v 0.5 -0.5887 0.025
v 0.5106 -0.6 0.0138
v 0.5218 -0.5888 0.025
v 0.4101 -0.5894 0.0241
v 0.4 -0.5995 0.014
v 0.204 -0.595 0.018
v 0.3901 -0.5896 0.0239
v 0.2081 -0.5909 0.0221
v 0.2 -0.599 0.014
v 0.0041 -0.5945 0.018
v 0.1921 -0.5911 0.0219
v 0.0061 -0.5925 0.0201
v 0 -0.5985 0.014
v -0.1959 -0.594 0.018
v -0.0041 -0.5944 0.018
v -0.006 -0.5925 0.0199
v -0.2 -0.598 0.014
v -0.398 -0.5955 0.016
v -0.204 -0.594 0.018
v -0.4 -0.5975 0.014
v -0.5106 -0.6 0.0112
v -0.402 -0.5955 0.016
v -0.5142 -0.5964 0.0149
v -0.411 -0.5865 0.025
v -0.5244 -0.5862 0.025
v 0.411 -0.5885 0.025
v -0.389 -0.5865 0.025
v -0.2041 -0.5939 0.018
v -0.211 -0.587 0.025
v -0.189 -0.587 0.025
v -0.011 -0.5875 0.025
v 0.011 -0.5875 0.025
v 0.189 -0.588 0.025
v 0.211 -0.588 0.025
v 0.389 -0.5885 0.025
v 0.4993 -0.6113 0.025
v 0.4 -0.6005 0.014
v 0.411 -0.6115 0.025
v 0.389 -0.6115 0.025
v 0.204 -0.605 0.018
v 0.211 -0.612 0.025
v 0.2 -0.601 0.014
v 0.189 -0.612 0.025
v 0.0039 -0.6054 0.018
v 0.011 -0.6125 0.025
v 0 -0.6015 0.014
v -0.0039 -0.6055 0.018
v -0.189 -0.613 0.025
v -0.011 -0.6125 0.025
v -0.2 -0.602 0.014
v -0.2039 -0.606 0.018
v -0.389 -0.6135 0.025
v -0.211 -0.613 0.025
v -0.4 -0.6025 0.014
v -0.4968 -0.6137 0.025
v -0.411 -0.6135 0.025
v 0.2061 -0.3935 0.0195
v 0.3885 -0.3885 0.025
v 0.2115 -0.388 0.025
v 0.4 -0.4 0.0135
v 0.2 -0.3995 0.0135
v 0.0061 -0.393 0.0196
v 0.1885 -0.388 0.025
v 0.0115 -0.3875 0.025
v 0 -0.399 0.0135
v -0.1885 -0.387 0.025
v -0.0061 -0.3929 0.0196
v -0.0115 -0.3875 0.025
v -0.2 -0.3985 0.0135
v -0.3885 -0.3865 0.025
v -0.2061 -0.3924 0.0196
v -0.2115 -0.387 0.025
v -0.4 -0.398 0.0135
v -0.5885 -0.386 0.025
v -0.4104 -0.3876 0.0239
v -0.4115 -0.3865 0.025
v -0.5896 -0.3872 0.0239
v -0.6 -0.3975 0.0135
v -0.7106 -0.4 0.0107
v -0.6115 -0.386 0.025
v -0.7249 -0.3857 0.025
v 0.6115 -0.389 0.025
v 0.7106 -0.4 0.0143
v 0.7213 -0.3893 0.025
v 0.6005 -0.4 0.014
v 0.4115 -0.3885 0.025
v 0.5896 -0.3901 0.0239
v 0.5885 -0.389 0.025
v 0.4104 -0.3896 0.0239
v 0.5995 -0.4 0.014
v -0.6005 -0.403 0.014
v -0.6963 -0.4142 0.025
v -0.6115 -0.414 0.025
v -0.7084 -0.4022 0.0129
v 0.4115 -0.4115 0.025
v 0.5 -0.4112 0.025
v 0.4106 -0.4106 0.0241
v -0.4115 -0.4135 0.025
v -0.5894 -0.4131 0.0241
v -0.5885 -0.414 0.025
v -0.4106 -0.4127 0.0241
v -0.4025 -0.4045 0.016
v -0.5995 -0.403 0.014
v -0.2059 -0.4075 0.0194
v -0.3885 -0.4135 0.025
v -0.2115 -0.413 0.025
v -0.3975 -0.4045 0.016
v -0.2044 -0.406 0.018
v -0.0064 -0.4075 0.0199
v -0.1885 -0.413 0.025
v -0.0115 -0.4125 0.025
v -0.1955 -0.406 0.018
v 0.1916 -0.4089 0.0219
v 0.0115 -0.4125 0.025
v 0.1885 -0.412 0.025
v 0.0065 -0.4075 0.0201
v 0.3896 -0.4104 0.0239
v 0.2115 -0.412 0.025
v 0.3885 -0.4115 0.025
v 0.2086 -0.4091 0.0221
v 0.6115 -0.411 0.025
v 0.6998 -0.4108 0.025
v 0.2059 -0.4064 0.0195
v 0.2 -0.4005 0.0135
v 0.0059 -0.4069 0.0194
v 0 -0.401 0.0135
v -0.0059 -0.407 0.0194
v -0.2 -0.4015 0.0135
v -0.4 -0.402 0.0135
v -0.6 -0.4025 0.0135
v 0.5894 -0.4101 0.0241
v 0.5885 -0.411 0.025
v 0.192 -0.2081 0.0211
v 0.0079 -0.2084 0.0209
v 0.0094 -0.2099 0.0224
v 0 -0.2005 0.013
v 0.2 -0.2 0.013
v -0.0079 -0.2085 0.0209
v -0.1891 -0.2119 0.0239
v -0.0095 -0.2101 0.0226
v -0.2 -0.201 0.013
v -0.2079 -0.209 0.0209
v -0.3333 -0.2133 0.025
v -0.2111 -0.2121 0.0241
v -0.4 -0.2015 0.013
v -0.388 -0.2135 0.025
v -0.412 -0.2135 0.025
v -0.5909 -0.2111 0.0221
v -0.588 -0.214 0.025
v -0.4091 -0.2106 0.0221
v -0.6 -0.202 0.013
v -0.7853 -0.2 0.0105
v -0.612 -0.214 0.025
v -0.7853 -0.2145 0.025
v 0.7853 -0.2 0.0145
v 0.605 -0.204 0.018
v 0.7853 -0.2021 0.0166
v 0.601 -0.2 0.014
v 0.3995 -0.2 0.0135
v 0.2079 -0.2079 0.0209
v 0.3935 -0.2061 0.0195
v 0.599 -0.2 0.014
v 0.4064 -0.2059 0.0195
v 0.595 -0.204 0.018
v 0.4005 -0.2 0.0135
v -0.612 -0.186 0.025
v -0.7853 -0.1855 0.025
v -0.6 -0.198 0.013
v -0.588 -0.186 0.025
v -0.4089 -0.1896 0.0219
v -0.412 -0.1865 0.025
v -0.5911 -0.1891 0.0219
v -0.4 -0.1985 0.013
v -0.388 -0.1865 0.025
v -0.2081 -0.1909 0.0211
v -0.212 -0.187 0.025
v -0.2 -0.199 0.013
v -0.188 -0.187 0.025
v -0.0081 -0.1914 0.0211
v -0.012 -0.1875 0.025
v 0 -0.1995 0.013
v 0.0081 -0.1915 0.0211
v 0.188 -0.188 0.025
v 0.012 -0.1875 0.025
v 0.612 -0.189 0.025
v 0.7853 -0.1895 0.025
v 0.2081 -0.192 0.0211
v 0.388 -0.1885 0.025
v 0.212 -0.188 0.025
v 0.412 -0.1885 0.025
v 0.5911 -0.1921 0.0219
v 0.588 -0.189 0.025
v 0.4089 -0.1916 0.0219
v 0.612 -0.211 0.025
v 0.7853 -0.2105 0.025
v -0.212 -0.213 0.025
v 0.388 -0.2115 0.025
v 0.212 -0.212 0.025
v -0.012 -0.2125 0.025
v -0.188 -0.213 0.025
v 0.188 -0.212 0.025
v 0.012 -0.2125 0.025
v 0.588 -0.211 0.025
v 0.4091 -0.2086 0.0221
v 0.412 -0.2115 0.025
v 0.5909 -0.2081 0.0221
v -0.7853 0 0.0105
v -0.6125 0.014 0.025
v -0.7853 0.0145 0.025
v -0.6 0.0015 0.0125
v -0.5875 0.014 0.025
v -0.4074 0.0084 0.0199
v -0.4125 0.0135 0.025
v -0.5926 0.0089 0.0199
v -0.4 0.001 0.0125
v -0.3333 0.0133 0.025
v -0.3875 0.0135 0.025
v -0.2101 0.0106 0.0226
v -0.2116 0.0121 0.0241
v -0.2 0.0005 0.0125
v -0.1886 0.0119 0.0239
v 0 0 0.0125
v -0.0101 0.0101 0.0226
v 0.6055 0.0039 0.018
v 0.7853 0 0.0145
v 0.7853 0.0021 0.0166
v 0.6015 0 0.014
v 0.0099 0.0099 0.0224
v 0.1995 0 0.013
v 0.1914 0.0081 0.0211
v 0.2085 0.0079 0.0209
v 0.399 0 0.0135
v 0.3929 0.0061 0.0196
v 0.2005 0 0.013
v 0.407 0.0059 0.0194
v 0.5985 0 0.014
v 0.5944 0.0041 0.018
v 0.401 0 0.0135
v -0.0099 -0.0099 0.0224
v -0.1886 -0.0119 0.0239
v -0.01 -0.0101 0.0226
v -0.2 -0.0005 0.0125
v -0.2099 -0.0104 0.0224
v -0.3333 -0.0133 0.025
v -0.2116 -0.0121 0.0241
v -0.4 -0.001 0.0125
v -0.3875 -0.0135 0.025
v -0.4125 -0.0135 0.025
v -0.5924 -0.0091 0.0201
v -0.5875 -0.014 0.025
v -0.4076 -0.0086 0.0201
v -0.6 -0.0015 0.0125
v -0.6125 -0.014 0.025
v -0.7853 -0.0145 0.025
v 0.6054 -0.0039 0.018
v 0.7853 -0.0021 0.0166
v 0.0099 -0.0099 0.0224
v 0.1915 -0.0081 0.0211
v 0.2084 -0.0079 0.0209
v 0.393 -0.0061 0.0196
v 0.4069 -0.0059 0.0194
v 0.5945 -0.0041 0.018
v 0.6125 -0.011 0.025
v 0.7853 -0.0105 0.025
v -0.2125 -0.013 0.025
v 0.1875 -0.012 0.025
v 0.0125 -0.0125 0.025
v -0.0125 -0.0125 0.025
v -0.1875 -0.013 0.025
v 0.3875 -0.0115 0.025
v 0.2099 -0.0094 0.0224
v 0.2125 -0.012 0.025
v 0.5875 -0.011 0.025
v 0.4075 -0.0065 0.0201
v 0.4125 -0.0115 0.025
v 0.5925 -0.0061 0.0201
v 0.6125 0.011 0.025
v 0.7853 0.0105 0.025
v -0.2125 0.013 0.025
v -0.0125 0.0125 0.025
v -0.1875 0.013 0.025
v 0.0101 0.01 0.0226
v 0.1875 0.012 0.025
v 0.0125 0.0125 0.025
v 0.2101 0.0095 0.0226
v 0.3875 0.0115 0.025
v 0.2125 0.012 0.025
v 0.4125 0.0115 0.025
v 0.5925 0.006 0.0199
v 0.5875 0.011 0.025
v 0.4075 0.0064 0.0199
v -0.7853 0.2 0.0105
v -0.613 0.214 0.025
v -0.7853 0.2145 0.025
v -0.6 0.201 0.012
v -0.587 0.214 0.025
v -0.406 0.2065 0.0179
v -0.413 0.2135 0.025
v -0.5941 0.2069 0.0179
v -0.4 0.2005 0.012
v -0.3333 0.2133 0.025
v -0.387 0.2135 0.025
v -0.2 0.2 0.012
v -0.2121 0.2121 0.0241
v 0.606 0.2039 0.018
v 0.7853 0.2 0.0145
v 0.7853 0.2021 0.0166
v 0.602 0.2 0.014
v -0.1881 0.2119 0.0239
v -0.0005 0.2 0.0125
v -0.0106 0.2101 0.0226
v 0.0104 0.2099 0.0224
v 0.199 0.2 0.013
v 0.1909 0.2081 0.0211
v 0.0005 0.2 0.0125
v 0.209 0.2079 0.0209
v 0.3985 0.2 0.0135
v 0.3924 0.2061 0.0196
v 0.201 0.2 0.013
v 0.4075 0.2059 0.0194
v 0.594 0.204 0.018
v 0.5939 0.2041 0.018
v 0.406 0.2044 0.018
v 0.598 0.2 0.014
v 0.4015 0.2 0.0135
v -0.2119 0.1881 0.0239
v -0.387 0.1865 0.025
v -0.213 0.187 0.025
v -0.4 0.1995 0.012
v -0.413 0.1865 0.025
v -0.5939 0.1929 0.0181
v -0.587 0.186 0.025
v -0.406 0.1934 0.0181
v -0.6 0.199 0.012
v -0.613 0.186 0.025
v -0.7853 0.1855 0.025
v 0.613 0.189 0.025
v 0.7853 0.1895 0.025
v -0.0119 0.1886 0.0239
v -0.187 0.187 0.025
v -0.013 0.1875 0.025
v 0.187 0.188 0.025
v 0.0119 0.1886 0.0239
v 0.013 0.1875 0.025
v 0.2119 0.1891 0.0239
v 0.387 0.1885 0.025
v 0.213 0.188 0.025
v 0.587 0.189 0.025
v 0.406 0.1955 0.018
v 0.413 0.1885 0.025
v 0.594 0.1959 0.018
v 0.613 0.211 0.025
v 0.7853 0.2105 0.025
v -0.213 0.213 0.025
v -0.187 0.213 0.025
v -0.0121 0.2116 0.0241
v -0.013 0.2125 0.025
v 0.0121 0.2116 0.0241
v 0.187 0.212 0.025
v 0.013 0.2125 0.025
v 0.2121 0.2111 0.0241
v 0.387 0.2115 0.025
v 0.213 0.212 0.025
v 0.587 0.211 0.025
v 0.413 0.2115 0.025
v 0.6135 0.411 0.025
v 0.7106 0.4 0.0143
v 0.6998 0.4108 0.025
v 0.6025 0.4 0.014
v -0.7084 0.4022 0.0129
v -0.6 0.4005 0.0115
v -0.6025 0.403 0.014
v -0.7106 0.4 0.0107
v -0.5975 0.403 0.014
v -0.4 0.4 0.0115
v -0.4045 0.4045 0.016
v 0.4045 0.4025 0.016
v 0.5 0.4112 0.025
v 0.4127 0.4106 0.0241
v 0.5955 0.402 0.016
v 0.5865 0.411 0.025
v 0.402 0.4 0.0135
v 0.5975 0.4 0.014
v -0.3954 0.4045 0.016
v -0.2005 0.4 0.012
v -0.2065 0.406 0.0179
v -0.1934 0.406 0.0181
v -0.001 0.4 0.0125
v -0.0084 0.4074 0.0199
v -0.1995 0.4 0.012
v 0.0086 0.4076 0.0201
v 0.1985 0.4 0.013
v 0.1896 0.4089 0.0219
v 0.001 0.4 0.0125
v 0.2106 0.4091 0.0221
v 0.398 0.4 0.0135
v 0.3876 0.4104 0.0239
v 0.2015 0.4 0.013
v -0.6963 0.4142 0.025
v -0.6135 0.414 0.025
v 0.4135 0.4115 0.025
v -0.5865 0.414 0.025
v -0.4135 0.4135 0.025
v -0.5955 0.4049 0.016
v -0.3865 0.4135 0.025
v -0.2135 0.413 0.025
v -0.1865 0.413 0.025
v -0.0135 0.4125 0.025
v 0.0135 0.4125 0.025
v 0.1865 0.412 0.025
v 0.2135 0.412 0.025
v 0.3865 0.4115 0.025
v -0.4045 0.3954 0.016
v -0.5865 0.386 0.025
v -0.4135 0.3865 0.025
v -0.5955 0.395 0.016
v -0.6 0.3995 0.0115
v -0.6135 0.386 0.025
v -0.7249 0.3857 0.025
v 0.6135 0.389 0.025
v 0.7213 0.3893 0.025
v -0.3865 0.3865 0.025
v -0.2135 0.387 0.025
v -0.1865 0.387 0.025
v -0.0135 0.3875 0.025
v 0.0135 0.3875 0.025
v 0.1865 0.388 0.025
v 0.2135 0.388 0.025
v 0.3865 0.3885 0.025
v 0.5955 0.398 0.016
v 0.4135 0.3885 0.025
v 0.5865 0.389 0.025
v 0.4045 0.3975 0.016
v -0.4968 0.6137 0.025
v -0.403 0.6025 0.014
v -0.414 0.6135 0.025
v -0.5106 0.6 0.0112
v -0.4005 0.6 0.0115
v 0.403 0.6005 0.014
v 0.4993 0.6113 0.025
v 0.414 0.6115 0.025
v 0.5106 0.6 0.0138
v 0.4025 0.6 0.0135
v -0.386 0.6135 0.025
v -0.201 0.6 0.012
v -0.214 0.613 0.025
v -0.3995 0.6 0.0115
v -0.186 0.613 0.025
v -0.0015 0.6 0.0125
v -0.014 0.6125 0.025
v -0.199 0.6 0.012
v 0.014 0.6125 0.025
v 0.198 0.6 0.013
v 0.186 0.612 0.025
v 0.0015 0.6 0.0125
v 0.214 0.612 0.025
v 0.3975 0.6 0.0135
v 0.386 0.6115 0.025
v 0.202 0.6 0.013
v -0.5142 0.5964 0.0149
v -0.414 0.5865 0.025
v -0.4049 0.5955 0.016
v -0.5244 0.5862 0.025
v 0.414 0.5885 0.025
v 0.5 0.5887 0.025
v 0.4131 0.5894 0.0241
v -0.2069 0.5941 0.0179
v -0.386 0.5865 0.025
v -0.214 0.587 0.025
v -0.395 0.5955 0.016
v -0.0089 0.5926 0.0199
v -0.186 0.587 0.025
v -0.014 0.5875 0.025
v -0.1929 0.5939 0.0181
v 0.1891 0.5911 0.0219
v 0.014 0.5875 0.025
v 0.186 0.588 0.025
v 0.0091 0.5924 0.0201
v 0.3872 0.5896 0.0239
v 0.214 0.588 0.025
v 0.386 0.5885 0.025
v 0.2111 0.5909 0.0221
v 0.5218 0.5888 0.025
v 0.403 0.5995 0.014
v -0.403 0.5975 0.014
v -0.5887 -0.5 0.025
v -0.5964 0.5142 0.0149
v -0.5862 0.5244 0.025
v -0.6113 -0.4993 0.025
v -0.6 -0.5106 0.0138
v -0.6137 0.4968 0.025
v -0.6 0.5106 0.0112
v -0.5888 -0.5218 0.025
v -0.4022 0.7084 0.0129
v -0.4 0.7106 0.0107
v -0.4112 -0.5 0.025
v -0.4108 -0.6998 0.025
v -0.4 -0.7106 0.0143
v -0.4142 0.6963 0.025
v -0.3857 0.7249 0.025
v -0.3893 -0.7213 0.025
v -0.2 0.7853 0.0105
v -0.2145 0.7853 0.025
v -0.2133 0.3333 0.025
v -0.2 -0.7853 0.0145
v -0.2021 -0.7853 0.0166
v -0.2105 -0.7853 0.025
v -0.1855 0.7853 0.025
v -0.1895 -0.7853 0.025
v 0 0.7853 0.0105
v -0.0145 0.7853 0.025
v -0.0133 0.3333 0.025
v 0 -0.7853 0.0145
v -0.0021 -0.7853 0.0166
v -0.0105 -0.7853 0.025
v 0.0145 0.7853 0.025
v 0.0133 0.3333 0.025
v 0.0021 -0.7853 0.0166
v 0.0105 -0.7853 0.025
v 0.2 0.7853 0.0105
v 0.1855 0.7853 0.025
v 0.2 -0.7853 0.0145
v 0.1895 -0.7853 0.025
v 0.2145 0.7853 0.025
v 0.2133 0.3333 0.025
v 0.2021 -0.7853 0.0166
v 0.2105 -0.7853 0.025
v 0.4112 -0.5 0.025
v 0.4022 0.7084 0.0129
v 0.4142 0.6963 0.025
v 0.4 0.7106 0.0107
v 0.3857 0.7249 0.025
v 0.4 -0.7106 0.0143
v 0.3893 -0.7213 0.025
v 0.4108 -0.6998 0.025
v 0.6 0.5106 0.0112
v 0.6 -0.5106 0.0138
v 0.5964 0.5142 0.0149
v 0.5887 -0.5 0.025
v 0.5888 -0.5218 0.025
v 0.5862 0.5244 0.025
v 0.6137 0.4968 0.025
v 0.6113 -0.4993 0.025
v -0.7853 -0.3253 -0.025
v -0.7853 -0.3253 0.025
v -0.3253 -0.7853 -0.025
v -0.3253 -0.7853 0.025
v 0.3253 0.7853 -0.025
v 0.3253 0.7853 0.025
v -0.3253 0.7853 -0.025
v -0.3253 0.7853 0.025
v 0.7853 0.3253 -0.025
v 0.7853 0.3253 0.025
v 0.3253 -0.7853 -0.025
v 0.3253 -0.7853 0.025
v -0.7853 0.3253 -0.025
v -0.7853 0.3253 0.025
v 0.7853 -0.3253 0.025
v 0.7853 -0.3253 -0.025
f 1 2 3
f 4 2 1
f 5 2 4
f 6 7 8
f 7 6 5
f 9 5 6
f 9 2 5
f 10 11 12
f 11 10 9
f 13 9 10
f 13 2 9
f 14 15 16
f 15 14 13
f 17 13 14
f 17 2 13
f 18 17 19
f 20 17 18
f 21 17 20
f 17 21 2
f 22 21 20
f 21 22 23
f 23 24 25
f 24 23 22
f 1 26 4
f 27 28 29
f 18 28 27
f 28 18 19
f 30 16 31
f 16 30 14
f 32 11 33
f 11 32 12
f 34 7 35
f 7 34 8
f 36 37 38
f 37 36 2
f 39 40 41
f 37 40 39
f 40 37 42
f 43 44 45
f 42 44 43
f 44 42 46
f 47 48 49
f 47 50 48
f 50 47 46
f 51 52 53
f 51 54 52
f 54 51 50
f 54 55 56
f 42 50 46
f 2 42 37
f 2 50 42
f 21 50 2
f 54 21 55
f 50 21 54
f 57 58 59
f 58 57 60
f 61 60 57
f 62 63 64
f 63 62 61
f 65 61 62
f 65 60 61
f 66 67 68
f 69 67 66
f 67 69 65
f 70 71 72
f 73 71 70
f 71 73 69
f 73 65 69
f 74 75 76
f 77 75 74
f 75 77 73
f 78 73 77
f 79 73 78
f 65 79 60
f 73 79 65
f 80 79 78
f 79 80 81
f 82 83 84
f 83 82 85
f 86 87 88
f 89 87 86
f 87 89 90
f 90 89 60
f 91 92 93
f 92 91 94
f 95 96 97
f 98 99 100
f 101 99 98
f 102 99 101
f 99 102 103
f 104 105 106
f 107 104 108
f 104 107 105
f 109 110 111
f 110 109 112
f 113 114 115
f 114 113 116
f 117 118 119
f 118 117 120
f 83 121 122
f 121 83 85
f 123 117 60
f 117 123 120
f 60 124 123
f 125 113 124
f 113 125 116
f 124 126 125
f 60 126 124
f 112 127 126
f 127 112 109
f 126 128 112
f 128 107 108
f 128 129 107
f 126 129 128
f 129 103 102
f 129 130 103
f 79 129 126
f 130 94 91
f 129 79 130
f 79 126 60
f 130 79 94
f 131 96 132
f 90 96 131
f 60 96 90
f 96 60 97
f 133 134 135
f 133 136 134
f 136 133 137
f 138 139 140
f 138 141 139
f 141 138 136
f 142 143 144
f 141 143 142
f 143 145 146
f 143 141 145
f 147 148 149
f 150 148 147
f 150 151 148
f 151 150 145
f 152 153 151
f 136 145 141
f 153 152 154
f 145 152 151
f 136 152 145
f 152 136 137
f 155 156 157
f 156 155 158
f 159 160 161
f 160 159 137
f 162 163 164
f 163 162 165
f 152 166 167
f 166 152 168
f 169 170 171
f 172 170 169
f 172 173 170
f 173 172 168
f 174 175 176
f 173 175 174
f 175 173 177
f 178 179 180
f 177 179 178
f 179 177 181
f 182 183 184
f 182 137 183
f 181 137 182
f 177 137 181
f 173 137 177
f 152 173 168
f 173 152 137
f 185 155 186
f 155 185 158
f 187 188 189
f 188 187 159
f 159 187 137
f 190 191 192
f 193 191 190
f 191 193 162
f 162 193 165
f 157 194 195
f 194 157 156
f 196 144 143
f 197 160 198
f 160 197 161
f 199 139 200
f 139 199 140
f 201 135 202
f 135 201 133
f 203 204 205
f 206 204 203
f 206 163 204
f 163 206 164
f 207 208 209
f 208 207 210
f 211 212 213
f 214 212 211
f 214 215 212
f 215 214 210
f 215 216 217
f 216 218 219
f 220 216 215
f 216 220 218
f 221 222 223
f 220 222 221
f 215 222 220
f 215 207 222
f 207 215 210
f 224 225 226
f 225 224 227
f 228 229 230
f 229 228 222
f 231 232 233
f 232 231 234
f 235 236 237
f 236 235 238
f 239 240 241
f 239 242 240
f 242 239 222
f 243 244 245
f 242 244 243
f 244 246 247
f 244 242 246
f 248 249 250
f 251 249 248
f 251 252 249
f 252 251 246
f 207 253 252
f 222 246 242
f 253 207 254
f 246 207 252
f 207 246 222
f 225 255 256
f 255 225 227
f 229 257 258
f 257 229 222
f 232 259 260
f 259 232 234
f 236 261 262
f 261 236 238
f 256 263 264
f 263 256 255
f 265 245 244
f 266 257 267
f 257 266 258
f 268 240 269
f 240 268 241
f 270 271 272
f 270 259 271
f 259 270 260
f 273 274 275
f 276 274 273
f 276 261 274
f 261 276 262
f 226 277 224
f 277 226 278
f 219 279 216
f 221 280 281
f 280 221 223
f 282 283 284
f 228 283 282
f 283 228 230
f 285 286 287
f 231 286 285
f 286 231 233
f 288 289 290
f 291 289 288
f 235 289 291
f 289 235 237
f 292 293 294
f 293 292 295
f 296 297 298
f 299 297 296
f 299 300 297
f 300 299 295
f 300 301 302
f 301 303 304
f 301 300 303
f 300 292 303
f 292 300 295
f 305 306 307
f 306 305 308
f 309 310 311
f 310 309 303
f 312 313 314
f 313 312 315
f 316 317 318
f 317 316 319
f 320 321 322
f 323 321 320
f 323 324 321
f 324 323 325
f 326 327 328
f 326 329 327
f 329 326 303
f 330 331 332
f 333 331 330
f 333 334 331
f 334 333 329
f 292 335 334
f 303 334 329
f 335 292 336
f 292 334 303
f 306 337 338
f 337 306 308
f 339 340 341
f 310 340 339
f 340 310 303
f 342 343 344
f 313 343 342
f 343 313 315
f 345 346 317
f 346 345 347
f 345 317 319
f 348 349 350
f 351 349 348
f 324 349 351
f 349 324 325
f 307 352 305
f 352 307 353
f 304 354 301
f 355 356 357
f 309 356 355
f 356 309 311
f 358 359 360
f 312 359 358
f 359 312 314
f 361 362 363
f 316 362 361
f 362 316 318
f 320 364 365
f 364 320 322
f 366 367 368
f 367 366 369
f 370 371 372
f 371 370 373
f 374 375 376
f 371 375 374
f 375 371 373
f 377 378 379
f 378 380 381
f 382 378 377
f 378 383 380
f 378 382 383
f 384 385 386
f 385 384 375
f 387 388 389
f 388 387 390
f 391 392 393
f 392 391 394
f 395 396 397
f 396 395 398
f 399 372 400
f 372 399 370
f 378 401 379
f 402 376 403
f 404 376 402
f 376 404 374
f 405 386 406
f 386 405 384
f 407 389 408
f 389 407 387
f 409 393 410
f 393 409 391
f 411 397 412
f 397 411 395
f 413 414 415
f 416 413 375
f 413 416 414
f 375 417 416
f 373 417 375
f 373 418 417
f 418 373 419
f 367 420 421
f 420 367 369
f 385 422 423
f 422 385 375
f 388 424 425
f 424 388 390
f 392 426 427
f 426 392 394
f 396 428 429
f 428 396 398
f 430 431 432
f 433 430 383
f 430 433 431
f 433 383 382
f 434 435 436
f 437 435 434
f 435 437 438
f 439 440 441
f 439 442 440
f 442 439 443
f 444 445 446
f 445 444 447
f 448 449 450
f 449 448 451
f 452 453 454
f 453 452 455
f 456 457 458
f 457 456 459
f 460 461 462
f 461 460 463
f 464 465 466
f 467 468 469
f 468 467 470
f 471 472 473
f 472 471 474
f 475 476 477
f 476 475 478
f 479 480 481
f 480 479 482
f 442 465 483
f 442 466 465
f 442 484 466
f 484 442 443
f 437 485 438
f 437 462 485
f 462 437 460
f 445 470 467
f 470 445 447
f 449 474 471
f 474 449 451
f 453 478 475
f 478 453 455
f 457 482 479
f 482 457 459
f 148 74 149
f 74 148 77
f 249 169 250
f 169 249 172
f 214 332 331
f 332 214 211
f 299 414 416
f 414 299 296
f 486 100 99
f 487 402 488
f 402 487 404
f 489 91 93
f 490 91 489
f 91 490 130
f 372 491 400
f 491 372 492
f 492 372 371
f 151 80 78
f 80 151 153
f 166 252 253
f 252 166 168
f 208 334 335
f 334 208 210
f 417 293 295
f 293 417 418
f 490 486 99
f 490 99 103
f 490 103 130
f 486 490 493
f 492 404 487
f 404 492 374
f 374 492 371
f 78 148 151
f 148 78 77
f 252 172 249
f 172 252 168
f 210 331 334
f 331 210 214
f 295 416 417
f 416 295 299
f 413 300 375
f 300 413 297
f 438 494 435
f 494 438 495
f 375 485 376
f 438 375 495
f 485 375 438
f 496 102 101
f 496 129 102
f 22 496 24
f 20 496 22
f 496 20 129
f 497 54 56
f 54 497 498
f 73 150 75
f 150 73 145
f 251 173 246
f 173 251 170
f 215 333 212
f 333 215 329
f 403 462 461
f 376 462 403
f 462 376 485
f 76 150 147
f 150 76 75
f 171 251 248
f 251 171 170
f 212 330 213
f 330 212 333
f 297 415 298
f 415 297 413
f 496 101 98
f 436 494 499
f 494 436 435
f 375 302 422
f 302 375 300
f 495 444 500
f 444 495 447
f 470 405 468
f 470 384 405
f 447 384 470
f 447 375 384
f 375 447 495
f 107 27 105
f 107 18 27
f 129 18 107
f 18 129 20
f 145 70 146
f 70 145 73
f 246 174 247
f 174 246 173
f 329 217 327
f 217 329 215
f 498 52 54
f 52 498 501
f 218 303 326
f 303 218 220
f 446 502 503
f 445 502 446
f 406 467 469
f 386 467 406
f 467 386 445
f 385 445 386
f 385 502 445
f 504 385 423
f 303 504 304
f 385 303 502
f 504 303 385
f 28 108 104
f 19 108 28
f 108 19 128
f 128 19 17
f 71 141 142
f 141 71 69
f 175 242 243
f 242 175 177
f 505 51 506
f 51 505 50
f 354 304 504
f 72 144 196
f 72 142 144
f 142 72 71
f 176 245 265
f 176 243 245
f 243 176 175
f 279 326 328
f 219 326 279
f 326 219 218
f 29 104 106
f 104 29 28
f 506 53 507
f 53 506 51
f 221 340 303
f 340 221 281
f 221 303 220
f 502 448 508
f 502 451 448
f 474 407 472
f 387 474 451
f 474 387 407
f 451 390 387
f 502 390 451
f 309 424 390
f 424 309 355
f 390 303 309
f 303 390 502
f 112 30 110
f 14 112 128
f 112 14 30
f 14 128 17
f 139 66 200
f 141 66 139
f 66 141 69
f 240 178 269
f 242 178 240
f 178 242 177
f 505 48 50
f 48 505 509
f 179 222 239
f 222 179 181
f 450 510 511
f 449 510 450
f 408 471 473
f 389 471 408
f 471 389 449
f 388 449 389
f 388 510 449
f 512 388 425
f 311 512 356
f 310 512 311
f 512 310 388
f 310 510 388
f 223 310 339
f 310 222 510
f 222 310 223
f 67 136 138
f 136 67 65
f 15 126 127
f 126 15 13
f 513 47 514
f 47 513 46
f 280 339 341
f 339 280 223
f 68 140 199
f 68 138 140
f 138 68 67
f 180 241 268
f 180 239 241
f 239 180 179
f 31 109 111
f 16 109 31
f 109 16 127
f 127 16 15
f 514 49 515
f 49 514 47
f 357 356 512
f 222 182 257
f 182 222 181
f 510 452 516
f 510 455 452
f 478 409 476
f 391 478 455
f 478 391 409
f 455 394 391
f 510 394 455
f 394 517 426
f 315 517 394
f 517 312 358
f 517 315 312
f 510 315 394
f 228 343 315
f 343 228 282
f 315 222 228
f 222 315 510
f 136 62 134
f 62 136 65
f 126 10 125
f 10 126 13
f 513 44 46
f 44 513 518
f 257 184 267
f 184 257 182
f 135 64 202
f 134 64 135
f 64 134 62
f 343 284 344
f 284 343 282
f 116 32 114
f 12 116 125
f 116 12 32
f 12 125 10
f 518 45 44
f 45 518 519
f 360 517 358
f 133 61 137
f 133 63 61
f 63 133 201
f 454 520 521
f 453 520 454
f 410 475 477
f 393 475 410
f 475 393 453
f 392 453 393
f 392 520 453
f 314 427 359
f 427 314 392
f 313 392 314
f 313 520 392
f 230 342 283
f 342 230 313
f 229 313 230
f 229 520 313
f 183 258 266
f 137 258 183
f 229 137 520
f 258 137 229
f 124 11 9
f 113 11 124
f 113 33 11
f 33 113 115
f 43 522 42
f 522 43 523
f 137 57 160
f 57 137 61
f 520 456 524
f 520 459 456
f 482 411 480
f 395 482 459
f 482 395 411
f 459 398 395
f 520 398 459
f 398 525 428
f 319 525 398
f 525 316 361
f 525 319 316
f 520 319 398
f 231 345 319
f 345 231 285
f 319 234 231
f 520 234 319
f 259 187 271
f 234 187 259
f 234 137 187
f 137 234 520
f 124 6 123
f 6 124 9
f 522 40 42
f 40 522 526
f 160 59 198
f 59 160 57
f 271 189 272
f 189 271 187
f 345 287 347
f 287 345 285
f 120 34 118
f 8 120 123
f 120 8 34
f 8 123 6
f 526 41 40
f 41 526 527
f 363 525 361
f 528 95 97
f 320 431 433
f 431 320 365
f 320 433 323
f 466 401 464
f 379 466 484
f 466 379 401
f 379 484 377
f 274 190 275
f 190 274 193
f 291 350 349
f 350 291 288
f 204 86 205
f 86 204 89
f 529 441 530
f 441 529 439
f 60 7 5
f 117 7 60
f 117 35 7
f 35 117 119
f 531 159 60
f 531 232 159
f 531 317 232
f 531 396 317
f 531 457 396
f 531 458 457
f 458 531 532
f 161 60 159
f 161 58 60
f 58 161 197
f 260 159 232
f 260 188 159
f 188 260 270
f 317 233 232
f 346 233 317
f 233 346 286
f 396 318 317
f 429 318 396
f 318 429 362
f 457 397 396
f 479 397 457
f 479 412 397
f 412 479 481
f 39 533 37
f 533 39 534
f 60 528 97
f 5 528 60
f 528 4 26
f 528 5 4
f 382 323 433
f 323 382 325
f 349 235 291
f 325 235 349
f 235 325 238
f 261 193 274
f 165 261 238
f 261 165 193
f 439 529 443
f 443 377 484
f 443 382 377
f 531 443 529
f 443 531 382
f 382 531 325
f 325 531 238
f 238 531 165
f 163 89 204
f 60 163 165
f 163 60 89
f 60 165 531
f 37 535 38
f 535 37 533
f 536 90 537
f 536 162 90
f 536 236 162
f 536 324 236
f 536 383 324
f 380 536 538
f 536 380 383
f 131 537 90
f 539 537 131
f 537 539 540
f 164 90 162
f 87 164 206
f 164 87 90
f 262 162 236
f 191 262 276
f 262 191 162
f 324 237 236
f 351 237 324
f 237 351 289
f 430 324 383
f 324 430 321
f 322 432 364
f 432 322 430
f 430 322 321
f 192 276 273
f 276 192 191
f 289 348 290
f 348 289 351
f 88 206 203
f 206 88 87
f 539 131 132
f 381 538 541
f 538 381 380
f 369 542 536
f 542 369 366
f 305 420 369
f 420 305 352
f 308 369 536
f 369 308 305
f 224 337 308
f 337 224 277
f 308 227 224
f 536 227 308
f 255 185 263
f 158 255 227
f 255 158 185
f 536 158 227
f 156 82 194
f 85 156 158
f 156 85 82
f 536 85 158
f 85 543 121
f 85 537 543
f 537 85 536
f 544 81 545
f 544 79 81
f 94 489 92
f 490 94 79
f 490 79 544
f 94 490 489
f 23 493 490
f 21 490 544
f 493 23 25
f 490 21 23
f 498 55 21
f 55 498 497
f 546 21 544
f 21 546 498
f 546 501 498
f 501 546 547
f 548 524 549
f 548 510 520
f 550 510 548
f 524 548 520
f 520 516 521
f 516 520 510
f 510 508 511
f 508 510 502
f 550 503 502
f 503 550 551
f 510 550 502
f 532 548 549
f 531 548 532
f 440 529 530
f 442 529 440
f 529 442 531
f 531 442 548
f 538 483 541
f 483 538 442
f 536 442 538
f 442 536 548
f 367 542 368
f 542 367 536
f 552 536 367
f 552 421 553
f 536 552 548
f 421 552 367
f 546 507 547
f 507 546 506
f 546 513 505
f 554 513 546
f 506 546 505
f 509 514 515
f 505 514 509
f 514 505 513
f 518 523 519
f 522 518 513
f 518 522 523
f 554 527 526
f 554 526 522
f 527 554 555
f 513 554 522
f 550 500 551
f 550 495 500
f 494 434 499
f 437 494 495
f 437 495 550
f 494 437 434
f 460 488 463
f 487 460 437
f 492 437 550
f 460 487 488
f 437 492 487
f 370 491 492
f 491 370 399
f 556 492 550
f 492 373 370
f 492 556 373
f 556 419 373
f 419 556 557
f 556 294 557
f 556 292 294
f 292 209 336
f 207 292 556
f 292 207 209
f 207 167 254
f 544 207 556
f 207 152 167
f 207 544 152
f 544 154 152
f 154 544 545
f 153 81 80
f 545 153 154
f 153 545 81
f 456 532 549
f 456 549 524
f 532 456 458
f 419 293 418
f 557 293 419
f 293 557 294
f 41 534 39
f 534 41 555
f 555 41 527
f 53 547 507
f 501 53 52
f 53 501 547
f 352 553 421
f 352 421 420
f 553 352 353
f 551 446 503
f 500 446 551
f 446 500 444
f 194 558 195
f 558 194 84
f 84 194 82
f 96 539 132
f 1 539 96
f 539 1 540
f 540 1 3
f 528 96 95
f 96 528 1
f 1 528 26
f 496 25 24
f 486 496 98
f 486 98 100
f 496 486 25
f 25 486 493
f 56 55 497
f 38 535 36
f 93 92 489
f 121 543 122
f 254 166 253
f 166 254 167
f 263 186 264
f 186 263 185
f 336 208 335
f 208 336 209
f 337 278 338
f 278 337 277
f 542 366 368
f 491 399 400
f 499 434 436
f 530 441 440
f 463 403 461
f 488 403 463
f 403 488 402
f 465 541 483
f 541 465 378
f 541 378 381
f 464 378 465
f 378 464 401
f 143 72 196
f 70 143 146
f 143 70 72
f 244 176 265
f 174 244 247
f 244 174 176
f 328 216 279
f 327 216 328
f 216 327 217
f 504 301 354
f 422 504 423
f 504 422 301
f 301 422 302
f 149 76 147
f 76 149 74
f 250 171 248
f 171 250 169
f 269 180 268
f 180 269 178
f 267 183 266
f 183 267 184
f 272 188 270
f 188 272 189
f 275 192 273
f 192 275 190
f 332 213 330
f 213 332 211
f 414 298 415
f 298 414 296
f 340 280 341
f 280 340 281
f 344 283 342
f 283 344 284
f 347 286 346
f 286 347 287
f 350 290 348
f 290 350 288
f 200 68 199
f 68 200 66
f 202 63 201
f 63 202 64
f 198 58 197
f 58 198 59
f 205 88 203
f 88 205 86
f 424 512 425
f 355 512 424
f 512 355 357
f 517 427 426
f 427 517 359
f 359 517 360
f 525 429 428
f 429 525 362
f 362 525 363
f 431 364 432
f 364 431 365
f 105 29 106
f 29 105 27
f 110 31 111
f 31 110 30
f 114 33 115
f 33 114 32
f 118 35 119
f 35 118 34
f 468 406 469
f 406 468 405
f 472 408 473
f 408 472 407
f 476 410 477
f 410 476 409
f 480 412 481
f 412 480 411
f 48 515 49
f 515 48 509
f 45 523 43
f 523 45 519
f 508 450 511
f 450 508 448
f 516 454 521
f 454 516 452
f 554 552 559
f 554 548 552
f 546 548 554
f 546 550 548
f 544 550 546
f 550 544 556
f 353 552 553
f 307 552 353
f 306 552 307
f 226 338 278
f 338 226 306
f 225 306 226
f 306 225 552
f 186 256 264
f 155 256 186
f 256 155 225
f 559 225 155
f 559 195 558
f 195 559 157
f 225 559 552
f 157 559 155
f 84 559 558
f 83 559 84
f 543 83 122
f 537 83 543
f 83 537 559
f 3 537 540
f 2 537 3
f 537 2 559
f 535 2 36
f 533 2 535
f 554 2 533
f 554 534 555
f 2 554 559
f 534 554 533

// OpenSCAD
use <lib.scad>

module padHD() {
	difference() {
		rotate([0,0,22.5]) cyl(0.85, 0.85, 0.05, $fn=8);
		for (y = [-0.6:0.2:0.7]) translate([0,y,0.03]) rotate([0,90,0]) cyl(0.02,0.015,2,$fn=4);
		for (x = [-0.6:0.2:0.7]) translate([x,0,0.03]) rotate([90,0,0]) cyl(0.02,0.015,2,$fn=4);
	}
}

module edgeHD() {
	rotate([0,0,22.5]) difference() {
		cyl(0.95, 0.95, 0.03, $fn=8);
		cyl(0.85, 0.85, 0.04, $fn=8);
	}
}

module padLD() {
	difference() {
		rotate([0,0,22.5]) cyl(0.85, 0.85, 0.05, $fn=8);
	}
}

module edgeLD() {
	edgeHD();
}

padHD();
//padLD();
//edgeHD();
//edgeLD();
